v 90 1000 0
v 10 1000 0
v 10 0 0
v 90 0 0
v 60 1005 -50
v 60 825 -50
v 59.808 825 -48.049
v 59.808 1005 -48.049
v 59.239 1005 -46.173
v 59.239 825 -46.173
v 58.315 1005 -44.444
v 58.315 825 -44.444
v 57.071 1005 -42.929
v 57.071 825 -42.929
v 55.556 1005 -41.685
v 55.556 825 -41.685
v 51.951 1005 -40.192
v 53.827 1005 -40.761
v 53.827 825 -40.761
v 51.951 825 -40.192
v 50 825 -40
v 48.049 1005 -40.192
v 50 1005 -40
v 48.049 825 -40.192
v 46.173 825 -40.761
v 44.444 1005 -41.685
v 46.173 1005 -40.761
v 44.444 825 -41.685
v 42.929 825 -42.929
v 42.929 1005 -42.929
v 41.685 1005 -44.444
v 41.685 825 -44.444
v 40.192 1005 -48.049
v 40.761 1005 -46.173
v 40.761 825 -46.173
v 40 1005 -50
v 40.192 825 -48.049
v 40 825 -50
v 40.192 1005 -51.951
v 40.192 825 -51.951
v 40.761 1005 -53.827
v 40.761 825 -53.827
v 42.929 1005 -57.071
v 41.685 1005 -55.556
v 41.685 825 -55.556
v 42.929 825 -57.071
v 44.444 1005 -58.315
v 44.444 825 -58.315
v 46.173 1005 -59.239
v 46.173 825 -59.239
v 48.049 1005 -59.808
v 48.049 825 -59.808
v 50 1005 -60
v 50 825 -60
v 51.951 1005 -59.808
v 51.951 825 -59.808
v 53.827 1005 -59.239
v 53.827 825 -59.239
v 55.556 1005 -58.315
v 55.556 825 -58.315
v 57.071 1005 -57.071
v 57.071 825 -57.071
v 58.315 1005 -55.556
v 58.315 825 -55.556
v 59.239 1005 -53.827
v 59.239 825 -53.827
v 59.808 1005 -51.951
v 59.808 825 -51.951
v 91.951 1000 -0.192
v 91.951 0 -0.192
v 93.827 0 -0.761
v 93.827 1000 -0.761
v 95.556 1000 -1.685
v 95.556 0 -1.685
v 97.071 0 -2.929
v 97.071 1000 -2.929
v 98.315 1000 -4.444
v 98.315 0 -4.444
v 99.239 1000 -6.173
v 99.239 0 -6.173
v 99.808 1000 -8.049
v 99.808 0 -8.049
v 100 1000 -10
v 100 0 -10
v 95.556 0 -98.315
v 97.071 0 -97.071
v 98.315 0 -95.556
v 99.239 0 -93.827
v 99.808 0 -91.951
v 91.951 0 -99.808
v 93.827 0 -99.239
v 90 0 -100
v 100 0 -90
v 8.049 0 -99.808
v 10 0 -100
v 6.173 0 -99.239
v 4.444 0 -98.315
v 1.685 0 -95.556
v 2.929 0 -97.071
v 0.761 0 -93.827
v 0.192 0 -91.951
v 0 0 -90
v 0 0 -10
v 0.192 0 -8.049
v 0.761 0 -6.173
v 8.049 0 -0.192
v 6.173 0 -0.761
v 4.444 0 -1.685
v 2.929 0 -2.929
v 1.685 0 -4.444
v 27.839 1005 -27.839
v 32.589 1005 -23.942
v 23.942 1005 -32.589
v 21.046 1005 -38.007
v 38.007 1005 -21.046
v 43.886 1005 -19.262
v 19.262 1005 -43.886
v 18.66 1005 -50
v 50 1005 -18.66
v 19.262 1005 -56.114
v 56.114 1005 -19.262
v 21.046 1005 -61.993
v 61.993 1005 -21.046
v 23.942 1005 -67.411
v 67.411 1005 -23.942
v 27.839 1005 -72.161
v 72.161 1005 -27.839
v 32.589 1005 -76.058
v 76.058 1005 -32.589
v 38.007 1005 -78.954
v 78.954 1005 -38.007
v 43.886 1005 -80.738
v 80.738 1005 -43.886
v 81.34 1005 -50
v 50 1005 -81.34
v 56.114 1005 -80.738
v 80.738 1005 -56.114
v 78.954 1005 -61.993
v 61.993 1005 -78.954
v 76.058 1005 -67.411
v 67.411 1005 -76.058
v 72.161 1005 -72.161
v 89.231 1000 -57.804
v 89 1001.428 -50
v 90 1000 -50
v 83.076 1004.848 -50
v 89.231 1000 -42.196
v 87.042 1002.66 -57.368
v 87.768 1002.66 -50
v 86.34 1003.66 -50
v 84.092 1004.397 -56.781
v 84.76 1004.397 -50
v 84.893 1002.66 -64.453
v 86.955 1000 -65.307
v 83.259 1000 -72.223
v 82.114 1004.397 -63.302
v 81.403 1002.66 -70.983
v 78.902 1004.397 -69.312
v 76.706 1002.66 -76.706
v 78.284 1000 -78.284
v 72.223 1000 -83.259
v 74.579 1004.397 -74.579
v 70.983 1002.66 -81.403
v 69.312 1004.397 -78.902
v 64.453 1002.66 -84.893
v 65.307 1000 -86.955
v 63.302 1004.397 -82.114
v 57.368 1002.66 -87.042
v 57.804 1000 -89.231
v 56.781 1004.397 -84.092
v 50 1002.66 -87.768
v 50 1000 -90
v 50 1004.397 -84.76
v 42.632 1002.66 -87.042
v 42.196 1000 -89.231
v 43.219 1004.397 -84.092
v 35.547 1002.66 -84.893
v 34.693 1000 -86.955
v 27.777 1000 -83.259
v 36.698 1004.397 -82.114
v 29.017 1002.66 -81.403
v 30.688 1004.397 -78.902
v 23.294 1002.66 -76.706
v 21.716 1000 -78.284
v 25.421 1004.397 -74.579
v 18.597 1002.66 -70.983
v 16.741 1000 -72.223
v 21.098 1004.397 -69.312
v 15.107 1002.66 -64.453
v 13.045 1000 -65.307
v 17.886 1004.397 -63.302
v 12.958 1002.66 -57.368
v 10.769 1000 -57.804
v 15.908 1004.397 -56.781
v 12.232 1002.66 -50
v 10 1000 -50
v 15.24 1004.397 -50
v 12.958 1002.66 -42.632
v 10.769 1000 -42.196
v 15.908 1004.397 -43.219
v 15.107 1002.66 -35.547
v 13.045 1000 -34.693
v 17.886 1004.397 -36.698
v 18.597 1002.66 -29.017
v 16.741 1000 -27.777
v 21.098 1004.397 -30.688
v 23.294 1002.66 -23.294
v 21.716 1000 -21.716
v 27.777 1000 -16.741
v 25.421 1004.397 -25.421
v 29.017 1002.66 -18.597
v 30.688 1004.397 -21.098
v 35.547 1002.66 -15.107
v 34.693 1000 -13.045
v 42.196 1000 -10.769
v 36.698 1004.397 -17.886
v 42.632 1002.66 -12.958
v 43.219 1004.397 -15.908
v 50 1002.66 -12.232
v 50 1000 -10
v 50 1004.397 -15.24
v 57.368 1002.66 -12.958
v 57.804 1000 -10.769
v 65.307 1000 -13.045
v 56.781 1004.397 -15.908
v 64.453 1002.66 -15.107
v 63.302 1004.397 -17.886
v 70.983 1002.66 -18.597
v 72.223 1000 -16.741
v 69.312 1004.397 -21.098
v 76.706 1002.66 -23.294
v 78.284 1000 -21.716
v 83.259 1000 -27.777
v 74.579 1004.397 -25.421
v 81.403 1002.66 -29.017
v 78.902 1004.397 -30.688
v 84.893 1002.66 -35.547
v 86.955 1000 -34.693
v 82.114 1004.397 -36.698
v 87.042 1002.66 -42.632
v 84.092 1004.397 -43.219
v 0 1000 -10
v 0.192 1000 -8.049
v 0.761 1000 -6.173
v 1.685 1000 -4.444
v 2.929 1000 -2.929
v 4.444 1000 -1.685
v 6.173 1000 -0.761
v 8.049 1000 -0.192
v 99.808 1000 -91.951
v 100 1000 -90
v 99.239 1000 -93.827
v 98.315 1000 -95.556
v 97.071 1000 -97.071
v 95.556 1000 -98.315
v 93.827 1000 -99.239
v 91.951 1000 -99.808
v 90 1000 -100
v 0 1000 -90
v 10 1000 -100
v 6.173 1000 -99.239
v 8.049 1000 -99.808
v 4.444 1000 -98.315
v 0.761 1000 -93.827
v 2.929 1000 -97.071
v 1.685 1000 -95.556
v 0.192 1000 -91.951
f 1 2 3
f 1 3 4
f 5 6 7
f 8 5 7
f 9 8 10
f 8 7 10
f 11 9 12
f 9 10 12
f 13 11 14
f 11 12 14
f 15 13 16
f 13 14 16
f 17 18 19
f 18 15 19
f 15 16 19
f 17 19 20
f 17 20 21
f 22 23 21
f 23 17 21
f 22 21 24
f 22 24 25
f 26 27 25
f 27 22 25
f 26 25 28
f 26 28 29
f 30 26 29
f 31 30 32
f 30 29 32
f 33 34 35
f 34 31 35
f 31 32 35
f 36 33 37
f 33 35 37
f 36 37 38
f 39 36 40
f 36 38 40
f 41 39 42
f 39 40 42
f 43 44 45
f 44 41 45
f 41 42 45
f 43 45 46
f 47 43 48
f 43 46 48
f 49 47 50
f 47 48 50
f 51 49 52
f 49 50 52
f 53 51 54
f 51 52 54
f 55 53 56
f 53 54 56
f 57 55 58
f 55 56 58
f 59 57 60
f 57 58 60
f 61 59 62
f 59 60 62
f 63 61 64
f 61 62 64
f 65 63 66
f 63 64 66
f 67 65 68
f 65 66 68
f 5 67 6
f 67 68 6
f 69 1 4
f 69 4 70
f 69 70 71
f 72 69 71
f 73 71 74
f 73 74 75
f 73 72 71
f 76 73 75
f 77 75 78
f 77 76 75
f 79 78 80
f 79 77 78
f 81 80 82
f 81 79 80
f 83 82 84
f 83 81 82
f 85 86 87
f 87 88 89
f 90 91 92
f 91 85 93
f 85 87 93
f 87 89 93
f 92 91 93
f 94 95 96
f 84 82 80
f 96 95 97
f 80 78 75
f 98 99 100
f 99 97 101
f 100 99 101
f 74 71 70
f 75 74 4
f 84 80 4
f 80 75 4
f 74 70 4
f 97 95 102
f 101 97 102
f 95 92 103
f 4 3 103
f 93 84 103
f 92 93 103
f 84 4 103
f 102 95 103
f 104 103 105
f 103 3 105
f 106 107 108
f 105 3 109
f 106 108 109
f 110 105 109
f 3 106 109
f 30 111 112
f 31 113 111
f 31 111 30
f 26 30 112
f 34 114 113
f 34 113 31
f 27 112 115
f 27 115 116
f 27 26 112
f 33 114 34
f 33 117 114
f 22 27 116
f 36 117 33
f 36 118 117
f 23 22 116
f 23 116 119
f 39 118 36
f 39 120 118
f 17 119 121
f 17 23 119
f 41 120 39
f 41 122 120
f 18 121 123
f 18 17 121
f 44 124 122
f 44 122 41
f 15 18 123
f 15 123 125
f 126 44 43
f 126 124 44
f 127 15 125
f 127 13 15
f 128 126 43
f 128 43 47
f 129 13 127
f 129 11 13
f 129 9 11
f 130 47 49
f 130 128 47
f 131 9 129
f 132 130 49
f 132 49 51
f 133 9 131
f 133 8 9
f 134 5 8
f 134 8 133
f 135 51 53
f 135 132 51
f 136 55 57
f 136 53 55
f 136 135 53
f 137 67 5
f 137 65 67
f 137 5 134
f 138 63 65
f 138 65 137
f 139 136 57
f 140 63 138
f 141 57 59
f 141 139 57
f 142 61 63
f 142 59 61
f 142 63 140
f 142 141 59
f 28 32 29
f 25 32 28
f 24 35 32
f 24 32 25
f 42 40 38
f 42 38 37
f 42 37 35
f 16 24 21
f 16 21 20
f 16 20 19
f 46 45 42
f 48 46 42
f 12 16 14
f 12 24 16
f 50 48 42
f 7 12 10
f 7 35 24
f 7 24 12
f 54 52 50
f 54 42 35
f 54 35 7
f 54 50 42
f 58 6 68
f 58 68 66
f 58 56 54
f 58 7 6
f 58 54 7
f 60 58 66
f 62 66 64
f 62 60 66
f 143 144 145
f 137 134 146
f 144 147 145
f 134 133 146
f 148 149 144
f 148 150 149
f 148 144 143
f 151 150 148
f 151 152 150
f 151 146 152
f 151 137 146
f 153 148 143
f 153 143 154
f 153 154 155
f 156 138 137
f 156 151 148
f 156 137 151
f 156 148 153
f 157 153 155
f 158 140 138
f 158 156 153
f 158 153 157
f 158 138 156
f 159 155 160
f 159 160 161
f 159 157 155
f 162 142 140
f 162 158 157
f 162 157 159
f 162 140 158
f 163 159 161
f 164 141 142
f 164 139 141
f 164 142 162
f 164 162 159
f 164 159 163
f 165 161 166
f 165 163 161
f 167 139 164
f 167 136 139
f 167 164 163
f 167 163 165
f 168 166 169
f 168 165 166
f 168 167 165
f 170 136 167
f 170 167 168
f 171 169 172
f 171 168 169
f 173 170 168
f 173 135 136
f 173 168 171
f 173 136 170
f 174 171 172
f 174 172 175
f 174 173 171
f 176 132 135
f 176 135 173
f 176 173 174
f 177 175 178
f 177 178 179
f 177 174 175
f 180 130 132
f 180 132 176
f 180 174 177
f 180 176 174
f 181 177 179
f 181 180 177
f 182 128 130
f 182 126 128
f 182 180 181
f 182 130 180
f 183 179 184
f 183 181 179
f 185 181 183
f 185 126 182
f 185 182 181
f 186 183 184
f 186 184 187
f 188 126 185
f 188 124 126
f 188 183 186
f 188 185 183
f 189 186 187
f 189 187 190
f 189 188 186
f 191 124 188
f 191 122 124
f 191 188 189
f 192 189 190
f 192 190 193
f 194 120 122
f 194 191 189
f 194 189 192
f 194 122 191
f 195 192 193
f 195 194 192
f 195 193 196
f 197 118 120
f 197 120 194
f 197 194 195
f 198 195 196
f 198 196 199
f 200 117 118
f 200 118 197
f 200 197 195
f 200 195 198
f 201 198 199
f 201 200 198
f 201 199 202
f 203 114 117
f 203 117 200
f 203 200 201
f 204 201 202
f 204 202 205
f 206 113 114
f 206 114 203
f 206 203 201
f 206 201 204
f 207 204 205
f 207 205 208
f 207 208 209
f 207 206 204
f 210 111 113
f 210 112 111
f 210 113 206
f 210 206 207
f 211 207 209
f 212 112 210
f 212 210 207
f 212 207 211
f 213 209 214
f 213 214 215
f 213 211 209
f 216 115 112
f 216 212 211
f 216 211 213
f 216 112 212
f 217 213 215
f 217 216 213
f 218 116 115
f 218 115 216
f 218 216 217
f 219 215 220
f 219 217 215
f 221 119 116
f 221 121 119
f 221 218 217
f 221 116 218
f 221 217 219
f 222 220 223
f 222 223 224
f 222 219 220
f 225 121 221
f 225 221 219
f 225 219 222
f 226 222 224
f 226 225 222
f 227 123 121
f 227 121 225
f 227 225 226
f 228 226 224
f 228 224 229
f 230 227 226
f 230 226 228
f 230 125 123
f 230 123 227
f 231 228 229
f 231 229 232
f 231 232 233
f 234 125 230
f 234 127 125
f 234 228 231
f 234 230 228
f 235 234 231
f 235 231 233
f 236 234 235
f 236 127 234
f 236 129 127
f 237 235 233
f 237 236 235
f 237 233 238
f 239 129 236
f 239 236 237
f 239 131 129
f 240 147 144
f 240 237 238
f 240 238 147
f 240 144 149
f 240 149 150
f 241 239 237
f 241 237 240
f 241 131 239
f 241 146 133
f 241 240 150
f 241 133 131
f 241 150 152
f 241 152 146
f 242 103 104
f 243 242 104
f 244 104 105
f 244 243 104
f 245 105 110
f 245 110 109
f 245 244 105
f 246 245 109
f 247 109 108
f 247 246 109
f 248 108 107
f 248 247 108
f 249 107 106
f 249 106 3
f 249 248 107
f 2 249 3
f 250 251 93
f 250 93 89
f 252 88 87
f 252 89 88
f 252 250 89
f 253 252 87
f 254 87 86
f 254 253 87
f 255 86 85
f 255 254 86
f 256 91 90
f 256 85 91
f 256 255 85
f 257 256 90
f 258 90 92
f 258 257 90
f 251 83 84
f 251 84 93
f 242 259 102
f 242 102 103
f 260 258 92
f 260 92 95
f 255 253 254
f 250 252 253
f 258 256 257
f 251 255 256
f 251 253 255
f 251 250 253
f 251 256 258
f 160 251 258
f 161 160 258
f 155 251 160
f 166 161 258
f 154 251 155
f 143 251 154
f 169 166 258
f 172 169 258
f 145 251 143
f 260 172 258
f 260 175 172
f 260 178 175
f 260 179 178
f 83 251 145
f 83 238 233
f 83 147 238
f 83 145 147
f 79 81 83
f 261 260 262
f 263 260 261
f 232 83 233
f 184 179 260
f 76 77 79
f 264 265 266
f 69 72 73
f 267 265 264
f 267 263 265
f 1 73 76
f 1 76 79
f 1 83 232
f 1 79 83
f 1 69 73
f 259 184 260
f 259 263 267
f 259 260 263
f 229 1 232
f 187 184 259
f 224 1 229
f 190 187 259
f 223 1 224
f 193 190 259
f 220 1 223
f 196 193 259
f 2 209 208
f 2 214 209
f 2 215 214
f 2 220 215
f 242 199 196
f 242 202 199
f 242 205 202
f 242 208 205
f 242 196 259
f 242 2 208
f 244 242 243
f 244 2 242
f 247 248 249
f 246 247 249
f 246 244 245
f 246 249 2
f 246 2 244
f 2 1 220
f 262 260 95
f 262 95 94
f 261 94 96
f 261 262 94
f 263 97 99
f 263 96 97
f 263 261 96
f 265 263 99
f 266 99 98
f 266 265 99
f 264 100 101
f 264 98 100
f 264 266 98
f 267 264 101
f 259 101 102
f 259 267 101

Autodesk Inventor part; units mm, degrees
ref_plane "YZ Plane" through (0, 0, 0) normal (1, 0, 0) x (0, 1, 0)
ref_plane "XZ Plane" through (0, 0, 0) normal (0, 1, 0) x (-1, 0, 0)
ref_plane "XY Plane" through (0, 0, 0) normal (0, 0, 1) x (1, 0, 0)
sketch "Sketch1" plane through (0, 0, 0) normal (0, 1, 0) x (-1, 0, 0)
  line L0 (0, 0) -> (-100, 0)
  line L1 (-100, 0) -> (-100, -100)
  line L2 (-100, -100) -> (0, -100)
  line L3 (0, -100) -> (0, 0)
  dimension "d0" = 100
  dimension "d1" = 100
extrude "Extrusion1" add sketch "Sketch1" along normal blind 1000
sketch "Sketch2" plane through (0, 1000, 0) normal (0, 1, 0) x (1, 0, 0)
  line L0 (100, 0) -> (100, 100) projected
  line L1 (100, 100) -> (0, 100) projected
  circle A0 centre (50, 50) radius 10
  circle A1 centre (50, 50) radius 40
  point P0 (0, 0)
  dimension "d4" = 20
  dimension "d5" = 80
extrude "Extrusion2" cut sketch "Sketch2" against normal blind 175 contours A0
extrude "Extrusion3" add sketch "Sketch2" along normal blind 5
fillet "Fillet1" radius 10 1 edges at (10, 1005, -50)
fillet "Fillet2" radius 10 4 edges at (100, 500, 0) (0, 500, 0) (0, 500, -100) (100, 500, -100)
properties part number "pneumatic_cylinder_ body" material "Stainless Steel"
